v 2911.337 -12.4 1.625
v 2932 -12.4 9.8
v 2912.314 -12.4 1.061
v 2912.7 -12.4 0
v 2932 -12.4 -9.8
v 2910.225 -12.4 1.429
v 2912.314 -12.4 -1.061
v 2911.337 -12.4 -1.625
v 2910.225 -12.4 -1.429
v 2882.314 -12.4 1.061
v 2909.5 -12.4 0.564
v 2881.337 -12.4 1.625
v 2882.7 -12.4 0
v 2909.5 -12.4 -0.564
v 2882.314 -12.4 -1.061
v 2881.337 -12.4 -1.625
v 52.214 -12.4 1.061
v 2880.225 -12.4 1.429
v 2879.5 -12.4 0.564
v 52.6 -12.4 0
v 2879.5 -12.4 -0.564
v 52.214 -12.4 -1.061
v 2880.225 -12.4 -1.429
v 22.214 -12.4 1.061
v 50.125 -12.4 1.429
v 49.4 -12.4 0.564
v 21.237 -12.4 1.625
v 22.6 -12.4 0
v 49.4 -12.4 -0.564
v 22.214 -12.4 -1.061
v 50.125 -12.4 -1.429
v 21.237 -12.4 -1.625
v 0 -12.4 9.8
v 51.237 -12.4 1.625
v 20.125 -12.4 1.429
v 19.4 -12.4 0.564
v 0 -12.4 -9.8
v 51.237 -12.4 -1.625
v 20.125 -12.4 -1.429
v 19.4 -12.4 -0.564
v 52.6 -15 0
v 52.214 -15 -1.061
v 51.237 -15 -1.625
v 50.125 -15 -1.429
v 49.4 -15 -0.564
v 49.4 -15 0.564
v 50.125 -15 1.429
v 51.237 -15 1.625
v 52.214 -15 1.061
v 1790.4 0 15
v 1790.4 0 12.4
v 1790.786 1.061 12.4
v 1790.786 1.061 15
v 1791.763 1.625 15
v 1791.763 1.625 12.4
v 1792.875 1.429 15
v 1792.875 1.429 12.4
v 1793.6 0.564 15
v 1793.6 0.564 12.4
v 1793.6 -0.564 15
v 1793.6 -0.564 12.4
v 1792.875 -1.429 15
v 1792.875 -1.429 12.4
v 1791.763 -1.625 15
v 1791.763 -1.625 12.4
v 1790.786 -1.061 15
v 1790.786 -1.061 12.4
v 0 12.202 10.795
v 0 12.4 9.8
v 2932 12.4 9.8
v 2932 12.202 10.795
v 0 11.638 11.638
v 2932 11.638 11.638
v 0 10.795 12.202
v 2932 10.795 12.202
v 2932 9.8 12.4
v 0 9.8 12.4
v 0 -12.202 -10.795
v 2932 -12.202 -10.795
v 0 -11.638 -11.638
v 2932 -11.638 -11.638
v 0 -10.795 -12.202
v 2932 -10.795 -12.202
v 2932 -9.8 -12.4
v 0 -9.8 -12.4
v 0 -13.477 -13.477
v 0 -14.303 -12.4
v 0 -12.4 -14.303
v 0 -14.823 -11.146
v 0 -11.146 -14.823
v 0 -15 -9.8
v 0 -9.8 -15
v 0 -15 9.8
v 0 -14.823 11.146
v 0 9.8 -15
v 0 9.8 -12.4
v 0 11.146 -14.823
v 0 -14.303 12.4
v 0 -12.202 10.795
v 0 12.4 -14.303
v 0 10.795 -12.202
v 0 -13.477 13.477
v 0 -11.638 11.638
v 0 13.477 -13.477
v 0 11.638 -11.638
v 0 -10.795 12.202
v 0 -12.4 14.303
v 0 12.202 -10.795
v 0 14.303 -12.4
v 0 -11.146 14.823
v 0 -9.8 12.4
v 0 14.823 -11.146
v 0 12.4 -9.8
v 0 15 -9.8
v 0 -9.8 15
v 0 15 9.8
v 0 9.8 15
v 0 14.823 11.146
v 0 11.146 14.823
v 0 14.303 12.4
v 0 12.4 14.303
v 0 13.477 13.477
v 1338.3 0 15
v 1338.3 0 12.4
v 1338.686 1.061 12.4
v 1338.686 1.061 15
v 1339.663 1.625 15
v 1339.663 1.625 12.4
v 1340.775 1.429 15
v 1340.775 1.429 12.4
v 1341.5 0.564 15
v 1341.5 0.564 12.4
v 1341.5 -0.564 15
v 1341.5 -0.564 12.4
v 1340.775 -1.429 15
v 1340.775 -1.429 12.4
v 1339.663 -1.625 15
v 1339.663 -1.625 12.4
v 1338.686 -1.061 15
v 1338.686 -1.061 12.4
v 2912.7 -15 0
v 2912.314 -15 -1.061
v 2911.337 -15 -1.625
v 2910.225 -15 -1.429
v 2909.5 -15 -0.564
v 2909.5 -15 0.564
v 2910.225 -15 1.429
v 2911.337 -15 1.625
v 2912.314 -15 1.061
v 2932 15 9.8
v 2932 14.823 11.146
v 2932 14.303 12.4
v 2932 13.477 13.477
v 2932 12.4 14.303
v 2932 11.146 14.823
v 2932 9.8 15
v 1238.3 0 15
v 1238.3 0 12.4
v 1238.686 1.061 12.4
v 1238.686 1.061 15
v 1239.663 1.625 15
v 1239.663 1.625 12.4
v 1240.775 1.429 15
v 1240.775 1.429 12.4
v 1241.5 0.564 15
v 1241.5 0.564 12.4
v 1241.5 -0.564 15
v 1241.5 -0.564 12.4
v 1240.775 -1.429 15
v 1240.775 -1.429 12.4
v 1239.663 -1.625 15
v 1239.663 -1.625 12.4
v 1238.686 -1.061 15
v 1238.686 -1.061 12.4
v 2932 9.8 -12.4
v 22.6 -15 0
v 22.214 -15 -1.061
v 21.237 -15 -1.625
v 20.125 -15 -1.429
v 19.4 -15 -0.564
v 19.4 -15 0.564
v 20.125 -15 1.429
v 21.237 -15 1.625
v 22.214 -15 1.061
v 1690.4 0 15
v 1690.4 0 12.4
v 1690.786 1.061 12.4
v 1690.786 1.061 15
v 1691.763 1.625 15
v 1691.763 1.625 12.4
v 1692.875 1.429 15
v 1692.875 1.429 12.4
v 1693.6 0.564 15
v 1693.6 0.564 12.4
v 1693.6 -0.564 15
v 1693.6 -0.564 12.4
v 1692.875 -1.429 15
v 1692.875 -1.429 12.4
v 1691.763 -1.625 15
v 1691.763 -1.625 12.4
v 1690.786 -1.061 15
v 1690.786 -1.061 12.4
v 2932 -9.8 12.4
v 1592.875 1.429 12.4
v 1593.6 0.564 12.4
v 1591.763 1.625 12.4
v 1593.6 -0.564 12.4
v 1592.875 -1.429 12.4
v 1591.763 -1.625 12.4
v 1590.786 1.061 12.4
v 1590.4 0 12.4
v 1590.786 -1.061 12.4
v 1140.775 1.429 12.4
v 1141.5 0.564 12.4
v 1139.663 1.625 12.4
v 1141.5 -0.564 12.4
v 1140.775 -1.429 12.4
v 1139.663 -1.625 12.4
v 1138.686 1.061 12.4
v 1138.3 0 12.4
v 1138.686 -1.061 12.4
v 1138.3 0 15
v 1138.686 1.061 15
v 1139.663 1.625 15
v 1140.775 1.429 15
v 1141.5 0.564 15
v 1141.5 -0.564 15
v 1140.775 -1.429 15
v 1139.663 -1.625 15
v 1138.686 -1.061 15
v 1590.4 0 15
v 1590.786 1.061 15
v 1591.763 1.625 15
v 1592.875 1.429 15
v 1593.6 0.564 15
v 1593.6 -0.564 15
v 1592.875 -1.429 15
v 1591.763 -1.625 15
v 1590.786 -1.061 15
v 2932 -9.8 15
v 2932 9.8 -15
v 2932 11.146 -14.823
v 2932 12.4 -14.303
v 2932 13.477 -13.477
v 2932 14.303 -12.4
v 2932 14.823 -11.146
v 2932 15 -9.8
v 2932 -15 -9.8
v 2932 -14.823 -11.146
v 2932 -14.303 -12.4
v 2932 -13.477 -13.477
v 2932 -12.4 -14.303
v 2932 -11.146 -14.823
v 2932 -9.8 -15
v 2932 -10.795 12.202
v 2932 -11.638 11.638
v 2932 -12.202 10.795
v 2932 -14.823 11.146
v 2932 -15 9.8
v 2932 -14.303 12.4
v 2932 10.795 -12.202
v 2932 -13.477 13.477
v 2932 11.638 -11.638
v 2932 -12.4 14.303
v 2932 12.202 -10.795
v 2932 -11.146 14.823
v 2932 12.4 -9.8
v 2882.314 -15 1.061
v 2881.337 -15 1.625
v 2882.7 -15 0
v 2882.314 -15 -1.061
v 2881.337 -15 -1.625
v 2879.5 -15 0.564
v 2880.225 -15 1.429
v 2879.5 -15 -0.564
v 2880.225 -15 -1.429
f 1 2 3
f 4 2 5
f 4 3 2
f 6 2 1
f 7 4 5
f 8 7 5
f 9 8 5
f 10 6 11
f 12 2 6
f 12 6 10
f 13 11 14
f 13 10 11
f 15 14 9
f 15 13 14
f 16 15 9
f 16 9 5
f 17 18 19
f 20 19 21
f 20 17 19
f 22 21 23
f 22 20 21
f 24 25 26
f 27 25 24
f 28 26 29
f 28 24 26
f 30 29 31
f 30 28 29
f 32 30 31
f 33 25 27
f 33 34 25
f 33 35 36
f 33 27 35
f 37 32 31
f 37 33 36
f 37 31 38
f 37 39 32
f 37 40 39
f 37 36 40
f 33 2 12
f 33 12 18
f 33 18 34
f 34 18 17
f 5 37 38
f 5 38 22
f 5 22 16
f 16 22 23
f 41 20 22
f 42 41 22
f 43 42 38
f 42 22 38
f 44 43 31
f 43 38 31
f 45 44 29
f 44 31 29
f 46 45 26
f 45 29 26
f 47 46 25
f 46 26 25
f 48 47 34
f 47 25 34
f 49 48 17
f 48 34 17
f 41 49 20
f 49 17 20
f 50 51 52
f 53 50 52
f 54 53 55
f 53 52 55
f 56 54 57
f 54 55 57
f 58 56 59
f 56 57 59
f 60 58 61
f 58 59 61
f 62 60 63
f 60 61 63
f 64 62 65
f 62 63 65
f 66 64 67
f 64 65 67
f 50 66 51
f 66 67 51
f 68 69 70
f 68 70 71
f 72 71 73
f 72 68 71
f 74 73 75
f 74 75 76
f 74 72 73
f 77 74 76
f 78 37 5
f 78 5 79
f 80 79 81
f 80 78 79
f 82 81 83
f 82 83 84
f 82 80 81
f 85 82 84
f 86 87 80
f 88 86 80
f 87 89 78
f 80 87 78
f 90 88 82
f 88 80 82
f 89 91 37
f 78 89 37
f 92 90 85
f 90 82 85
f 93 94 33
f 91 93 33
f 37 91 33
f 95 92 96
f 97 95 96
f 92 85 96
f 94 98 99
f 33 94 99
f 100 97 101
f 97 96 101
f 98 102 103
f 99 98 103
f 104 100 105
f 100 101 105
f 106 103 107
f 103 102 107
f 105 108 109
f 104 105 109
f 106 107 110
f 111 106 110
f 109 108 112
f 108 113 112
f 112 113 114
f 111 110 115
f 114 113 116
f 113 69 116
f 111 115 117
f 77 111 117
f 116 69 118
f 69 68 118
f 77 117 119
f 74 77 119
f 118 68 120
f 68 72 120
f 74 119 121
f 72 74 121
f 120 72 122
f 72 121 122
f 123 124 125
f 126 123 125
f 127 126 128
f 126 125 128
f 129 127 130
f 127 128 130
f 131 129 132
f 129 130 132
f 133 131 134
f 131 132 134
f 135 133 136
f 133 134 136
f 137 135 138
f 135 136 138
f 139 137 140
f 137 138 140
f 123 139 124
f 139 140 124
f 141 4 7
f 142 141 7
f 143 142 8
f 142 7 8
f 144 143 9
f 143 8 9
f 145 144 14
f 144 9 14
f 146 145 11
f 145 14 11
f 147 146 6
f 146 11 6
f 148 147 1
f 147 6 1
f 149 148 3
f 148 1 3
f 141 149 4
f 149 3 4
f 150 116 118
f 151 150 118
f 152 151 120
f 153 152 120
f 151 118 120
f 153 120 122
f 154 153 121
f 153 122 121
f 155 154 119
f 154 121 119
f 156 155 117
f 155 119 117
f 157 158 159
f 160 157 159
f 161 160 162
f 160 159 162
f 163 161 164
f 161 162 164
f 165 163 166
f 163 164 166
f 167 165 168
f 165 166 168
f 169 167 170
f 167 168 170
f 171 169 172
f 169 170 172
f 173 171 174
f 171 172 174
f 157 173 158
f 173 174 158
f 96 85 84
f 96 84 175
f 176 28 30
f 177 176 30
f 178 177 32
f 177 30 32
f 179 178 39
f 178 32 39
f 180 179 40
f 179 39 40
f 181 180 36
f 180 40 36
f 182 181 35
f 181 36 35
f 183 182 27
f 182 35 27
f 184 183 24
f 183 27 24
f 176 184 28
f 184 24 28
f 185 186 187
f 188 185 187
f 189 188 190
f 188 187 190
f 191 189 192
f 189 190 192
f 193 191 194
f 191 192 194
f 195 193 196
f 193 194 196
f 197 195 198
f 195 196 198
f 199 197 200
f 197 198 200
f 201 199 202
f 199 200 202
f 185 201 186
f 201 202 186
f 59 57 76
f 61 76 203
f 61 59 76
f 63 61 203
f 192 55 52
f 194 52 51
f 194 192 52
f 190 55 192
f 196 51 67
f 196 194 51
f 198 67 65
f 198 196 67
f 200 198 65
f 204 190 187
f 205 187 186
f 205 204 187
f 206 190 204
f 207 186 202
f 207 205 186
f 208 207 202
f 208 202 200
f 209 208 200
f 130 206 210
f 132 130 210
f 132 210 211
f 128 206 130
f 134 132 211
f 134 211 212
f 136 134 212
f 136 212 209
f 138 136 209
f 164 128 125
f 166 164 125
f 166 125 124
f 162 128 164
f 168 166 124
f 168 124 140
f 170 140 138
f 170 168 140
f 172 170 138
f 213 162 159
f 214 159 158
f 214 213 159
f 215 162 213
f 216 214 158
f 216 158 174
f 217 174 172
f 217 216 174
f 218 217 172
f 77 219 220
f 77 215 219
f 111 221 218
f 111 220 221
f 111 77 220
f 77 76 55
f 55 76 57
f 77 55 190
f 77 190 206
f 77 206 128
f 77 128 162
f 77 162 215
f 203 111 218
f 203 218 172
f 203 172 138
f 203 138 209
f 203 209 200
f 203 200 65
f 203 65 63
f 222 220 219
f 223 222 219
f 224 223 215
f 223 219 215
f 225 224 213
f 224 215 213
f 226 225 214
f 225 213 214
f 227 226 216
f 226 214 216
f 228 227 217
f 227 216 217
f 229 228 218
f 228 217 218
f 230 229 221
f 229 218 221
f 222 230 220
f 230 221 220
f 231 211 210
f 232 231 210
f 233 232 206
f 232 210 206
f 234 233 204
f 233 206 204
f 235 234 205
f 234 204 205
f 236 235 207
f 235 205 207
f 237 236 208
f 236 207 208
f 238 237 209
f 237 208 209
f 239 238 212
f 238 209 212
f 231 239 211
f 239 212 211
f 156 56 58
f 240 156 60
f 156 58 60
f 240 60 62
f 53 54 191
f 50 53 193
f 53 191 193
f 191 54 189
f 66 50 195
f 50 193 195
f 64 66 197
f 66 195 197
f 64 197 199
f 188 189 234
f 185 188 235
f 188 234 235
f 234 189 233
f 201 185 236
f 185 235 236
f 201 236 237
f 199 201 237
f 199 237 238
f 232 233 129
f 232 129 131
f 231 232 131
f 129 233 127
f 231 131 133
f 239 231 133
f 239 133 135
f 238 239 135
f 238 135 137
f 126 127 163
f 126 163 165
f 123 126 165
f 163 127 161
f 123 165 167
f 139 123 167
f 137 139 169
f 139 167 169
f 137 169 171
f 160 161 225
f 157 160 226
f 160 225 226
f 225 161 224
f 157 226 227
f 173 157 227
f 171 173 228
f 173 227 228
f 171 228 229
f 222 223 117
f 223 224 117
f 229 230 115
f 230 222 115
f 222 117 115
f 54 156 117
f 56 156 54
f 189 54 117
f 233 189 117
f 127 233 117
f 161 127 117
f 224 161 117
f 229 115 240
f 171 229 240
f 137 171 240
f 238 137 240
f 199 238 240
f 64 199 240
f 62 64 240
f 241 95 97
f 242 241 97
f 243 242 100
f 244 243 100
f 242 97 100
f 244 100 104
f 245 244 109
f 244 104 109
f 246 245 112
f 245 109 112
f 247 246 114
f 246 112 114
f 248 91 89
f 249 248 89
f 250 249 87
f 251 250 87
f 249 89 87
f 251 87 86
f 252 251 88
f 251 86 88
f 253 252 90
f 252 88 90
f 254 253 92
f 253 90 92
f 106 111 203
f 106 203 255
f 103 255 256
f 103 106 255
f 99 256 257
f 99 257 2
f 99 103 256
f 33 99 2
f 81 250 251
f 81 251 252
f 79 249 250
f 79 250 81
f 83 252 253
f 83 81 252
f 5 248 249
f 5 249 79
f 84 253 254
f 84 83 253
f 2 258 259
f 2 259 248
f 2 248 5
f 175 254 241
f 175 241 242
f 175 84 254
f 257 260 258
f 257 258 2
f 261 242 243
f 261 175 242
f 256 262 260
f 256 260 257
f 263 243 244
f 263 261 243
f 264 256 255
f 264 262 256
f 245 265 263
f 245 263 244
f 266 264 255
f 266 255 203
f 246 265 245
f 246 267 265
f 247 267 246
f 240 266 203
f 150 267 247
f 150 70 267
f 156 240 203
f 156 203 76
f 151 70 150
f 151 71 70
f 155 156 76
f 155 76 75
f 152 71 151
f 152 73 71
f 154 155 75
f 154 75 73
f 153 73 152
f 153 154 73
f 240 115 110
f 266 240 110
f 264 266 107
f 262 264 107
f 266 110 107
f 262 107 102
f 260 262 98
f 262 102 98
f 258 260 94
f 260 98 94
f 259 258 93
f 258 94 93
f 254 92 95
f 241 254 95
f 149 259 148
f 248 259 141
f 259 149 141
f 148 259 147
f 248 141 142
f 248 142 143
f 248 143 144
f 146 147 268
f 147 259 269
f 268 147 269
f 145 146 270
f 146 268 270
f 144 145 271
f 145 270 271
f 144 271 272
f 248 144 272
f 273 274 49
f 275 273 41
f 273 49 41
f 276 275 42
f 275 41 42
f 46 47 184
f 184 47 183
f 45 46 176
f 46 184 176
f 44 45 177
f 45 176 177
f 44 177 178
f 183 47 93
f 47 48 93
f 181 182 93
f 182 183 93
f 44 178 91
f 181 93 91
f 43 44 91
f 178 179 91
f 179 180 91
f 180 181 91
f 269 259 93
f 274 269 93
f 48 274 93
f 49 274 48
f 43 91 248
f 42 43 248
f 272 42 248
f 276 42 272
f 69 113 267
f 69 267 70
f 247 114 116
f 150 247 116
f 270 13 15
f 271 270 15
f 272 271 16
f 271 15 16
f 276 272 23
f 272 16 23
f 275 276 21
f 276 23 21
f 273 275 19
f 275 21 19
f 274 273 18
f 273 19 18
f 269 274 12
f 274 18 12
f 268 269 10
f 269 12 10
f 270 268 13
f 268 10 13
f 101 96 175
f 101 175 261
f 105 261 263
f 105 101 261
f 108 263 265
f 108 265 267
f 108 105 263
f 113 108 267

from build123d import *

# Parameters (mm, degrees)
MEMBER_1_DEPTH         = 2932
HOLE_WIZARD_M4_1_D     = 3.3
HOLE_WIZARD_M4_1_DEPTH = 10.1
HOLE_WIZARD_M4_1_TIP   = 0.991420021
HOLE_WIZARD_M4_2_D     = 3.3
HOLE_WIZARD_M4_2_DEPTH = 10.1
HOLE_WIZARD_M4_2_TIP   = 0.991420021


with BuildPart() as part:
    # Sketch1 → Member 1 (new body)
    with BuildSketch(Plane.YZ):
        with BuildLine():
            Line((-9.8, -15), (9.8, -15))
            ThreePointArc((9.8, -15), (13.476955262, -13.476955262), (15, -9.8))
            Line((15, -9.8), (15, 9.8))
            ThreePointArc((15, 9.8), (13.476955262, 13.476955262), (9.8, 15))
            Line((9.8, 15), (-9.8, 15))
            ThreePointArc((-9.8, 15), (-13.476955262, 13.476955262), (-15, 9.8))
            Line((-15, 9.8), (-15, -9.8))
            ThreePointArc((-15, -9.8), (-13.476955262, -13.476955262), (-9.8, -15))
        make_face()
        with BuildLine():
            Line((-9.8, -12.4), (9.8, -12.4))
            ThreePointArc((9.8, -12.4), (11.638477631, -11.638477631), (12.4, -9.8))
            Line((12.4, -9.8), (12.4, 9.8))
            ThreePointArc((12.4, 9.8), (11.638477631, 11.638477631), (9.8, 12.4))
            Line((9.8, 12.4), (-9.8, 12.4))
            ThreePointArc((-9.8, 12.4), (-11.638477631, 11.638477631), (-12.4, 9.8))
            Line((-12.4, 9.8), (-12.4, -9.8))
            ThreePointArc((-12.4, -9.8), (-11.638477631, -11.638477631), (-9.8, -12.4))
        make_face(mode=Mode.SUBTRACT)
    extrude(amount=MEMBER_1_DEPTH)

    # M4 螺纹孔1
    with Locations(Plane(origin=(0, -15, 0), x_dir=(-1, 0, 0), z_dir=(0, -1, 0))):
        with Locations((-20.95, 0), (-50.95, 0), (-2881.05, 0), (-2911.05, 0)):
            Hole(HOLE_WIZARD_M4_1_D / 2, depth=HOLE_WIZARD_M4_1_DEPTH)
            with Locations((0, 0, -(HOLE_WIZARD_M4_1_DEPTH + HOLE_WIZARD_M4_1_TIP / 2))):  # 118° drill point
                Cone(0, HOLE_WIZARD_M4_1_D / 2, HOLE_WIZARD_M4_1_TIP, mode=Mode.SUBTRACT)

    # M4 螺纹孔2
    with Locations(Plane.XY.offset(15)):
        with Locations((1139.95, 0), (1239.95, 0), (1339.95, 0), (1592.05, 0), (1692.05, 0), (1792.05, 0)):
            Hole(HOLE_WIZARD_M4_2_D / 2, depth=HOLE_WIZARD_M4_2_DEPTH)
            with Locations((0, 0, -(HOLE_WIZARD_M4_2_DEPTH + HOLE_WIZARD_M4_2_TIP / 2))):  # 118° drill point
                Cone(0, HOLE_WIZARD_M4_2_D / 2, HOLE_WIZARD_M4_2_TIP, mode=Mode.SUBTRACT)


solid = part.part
